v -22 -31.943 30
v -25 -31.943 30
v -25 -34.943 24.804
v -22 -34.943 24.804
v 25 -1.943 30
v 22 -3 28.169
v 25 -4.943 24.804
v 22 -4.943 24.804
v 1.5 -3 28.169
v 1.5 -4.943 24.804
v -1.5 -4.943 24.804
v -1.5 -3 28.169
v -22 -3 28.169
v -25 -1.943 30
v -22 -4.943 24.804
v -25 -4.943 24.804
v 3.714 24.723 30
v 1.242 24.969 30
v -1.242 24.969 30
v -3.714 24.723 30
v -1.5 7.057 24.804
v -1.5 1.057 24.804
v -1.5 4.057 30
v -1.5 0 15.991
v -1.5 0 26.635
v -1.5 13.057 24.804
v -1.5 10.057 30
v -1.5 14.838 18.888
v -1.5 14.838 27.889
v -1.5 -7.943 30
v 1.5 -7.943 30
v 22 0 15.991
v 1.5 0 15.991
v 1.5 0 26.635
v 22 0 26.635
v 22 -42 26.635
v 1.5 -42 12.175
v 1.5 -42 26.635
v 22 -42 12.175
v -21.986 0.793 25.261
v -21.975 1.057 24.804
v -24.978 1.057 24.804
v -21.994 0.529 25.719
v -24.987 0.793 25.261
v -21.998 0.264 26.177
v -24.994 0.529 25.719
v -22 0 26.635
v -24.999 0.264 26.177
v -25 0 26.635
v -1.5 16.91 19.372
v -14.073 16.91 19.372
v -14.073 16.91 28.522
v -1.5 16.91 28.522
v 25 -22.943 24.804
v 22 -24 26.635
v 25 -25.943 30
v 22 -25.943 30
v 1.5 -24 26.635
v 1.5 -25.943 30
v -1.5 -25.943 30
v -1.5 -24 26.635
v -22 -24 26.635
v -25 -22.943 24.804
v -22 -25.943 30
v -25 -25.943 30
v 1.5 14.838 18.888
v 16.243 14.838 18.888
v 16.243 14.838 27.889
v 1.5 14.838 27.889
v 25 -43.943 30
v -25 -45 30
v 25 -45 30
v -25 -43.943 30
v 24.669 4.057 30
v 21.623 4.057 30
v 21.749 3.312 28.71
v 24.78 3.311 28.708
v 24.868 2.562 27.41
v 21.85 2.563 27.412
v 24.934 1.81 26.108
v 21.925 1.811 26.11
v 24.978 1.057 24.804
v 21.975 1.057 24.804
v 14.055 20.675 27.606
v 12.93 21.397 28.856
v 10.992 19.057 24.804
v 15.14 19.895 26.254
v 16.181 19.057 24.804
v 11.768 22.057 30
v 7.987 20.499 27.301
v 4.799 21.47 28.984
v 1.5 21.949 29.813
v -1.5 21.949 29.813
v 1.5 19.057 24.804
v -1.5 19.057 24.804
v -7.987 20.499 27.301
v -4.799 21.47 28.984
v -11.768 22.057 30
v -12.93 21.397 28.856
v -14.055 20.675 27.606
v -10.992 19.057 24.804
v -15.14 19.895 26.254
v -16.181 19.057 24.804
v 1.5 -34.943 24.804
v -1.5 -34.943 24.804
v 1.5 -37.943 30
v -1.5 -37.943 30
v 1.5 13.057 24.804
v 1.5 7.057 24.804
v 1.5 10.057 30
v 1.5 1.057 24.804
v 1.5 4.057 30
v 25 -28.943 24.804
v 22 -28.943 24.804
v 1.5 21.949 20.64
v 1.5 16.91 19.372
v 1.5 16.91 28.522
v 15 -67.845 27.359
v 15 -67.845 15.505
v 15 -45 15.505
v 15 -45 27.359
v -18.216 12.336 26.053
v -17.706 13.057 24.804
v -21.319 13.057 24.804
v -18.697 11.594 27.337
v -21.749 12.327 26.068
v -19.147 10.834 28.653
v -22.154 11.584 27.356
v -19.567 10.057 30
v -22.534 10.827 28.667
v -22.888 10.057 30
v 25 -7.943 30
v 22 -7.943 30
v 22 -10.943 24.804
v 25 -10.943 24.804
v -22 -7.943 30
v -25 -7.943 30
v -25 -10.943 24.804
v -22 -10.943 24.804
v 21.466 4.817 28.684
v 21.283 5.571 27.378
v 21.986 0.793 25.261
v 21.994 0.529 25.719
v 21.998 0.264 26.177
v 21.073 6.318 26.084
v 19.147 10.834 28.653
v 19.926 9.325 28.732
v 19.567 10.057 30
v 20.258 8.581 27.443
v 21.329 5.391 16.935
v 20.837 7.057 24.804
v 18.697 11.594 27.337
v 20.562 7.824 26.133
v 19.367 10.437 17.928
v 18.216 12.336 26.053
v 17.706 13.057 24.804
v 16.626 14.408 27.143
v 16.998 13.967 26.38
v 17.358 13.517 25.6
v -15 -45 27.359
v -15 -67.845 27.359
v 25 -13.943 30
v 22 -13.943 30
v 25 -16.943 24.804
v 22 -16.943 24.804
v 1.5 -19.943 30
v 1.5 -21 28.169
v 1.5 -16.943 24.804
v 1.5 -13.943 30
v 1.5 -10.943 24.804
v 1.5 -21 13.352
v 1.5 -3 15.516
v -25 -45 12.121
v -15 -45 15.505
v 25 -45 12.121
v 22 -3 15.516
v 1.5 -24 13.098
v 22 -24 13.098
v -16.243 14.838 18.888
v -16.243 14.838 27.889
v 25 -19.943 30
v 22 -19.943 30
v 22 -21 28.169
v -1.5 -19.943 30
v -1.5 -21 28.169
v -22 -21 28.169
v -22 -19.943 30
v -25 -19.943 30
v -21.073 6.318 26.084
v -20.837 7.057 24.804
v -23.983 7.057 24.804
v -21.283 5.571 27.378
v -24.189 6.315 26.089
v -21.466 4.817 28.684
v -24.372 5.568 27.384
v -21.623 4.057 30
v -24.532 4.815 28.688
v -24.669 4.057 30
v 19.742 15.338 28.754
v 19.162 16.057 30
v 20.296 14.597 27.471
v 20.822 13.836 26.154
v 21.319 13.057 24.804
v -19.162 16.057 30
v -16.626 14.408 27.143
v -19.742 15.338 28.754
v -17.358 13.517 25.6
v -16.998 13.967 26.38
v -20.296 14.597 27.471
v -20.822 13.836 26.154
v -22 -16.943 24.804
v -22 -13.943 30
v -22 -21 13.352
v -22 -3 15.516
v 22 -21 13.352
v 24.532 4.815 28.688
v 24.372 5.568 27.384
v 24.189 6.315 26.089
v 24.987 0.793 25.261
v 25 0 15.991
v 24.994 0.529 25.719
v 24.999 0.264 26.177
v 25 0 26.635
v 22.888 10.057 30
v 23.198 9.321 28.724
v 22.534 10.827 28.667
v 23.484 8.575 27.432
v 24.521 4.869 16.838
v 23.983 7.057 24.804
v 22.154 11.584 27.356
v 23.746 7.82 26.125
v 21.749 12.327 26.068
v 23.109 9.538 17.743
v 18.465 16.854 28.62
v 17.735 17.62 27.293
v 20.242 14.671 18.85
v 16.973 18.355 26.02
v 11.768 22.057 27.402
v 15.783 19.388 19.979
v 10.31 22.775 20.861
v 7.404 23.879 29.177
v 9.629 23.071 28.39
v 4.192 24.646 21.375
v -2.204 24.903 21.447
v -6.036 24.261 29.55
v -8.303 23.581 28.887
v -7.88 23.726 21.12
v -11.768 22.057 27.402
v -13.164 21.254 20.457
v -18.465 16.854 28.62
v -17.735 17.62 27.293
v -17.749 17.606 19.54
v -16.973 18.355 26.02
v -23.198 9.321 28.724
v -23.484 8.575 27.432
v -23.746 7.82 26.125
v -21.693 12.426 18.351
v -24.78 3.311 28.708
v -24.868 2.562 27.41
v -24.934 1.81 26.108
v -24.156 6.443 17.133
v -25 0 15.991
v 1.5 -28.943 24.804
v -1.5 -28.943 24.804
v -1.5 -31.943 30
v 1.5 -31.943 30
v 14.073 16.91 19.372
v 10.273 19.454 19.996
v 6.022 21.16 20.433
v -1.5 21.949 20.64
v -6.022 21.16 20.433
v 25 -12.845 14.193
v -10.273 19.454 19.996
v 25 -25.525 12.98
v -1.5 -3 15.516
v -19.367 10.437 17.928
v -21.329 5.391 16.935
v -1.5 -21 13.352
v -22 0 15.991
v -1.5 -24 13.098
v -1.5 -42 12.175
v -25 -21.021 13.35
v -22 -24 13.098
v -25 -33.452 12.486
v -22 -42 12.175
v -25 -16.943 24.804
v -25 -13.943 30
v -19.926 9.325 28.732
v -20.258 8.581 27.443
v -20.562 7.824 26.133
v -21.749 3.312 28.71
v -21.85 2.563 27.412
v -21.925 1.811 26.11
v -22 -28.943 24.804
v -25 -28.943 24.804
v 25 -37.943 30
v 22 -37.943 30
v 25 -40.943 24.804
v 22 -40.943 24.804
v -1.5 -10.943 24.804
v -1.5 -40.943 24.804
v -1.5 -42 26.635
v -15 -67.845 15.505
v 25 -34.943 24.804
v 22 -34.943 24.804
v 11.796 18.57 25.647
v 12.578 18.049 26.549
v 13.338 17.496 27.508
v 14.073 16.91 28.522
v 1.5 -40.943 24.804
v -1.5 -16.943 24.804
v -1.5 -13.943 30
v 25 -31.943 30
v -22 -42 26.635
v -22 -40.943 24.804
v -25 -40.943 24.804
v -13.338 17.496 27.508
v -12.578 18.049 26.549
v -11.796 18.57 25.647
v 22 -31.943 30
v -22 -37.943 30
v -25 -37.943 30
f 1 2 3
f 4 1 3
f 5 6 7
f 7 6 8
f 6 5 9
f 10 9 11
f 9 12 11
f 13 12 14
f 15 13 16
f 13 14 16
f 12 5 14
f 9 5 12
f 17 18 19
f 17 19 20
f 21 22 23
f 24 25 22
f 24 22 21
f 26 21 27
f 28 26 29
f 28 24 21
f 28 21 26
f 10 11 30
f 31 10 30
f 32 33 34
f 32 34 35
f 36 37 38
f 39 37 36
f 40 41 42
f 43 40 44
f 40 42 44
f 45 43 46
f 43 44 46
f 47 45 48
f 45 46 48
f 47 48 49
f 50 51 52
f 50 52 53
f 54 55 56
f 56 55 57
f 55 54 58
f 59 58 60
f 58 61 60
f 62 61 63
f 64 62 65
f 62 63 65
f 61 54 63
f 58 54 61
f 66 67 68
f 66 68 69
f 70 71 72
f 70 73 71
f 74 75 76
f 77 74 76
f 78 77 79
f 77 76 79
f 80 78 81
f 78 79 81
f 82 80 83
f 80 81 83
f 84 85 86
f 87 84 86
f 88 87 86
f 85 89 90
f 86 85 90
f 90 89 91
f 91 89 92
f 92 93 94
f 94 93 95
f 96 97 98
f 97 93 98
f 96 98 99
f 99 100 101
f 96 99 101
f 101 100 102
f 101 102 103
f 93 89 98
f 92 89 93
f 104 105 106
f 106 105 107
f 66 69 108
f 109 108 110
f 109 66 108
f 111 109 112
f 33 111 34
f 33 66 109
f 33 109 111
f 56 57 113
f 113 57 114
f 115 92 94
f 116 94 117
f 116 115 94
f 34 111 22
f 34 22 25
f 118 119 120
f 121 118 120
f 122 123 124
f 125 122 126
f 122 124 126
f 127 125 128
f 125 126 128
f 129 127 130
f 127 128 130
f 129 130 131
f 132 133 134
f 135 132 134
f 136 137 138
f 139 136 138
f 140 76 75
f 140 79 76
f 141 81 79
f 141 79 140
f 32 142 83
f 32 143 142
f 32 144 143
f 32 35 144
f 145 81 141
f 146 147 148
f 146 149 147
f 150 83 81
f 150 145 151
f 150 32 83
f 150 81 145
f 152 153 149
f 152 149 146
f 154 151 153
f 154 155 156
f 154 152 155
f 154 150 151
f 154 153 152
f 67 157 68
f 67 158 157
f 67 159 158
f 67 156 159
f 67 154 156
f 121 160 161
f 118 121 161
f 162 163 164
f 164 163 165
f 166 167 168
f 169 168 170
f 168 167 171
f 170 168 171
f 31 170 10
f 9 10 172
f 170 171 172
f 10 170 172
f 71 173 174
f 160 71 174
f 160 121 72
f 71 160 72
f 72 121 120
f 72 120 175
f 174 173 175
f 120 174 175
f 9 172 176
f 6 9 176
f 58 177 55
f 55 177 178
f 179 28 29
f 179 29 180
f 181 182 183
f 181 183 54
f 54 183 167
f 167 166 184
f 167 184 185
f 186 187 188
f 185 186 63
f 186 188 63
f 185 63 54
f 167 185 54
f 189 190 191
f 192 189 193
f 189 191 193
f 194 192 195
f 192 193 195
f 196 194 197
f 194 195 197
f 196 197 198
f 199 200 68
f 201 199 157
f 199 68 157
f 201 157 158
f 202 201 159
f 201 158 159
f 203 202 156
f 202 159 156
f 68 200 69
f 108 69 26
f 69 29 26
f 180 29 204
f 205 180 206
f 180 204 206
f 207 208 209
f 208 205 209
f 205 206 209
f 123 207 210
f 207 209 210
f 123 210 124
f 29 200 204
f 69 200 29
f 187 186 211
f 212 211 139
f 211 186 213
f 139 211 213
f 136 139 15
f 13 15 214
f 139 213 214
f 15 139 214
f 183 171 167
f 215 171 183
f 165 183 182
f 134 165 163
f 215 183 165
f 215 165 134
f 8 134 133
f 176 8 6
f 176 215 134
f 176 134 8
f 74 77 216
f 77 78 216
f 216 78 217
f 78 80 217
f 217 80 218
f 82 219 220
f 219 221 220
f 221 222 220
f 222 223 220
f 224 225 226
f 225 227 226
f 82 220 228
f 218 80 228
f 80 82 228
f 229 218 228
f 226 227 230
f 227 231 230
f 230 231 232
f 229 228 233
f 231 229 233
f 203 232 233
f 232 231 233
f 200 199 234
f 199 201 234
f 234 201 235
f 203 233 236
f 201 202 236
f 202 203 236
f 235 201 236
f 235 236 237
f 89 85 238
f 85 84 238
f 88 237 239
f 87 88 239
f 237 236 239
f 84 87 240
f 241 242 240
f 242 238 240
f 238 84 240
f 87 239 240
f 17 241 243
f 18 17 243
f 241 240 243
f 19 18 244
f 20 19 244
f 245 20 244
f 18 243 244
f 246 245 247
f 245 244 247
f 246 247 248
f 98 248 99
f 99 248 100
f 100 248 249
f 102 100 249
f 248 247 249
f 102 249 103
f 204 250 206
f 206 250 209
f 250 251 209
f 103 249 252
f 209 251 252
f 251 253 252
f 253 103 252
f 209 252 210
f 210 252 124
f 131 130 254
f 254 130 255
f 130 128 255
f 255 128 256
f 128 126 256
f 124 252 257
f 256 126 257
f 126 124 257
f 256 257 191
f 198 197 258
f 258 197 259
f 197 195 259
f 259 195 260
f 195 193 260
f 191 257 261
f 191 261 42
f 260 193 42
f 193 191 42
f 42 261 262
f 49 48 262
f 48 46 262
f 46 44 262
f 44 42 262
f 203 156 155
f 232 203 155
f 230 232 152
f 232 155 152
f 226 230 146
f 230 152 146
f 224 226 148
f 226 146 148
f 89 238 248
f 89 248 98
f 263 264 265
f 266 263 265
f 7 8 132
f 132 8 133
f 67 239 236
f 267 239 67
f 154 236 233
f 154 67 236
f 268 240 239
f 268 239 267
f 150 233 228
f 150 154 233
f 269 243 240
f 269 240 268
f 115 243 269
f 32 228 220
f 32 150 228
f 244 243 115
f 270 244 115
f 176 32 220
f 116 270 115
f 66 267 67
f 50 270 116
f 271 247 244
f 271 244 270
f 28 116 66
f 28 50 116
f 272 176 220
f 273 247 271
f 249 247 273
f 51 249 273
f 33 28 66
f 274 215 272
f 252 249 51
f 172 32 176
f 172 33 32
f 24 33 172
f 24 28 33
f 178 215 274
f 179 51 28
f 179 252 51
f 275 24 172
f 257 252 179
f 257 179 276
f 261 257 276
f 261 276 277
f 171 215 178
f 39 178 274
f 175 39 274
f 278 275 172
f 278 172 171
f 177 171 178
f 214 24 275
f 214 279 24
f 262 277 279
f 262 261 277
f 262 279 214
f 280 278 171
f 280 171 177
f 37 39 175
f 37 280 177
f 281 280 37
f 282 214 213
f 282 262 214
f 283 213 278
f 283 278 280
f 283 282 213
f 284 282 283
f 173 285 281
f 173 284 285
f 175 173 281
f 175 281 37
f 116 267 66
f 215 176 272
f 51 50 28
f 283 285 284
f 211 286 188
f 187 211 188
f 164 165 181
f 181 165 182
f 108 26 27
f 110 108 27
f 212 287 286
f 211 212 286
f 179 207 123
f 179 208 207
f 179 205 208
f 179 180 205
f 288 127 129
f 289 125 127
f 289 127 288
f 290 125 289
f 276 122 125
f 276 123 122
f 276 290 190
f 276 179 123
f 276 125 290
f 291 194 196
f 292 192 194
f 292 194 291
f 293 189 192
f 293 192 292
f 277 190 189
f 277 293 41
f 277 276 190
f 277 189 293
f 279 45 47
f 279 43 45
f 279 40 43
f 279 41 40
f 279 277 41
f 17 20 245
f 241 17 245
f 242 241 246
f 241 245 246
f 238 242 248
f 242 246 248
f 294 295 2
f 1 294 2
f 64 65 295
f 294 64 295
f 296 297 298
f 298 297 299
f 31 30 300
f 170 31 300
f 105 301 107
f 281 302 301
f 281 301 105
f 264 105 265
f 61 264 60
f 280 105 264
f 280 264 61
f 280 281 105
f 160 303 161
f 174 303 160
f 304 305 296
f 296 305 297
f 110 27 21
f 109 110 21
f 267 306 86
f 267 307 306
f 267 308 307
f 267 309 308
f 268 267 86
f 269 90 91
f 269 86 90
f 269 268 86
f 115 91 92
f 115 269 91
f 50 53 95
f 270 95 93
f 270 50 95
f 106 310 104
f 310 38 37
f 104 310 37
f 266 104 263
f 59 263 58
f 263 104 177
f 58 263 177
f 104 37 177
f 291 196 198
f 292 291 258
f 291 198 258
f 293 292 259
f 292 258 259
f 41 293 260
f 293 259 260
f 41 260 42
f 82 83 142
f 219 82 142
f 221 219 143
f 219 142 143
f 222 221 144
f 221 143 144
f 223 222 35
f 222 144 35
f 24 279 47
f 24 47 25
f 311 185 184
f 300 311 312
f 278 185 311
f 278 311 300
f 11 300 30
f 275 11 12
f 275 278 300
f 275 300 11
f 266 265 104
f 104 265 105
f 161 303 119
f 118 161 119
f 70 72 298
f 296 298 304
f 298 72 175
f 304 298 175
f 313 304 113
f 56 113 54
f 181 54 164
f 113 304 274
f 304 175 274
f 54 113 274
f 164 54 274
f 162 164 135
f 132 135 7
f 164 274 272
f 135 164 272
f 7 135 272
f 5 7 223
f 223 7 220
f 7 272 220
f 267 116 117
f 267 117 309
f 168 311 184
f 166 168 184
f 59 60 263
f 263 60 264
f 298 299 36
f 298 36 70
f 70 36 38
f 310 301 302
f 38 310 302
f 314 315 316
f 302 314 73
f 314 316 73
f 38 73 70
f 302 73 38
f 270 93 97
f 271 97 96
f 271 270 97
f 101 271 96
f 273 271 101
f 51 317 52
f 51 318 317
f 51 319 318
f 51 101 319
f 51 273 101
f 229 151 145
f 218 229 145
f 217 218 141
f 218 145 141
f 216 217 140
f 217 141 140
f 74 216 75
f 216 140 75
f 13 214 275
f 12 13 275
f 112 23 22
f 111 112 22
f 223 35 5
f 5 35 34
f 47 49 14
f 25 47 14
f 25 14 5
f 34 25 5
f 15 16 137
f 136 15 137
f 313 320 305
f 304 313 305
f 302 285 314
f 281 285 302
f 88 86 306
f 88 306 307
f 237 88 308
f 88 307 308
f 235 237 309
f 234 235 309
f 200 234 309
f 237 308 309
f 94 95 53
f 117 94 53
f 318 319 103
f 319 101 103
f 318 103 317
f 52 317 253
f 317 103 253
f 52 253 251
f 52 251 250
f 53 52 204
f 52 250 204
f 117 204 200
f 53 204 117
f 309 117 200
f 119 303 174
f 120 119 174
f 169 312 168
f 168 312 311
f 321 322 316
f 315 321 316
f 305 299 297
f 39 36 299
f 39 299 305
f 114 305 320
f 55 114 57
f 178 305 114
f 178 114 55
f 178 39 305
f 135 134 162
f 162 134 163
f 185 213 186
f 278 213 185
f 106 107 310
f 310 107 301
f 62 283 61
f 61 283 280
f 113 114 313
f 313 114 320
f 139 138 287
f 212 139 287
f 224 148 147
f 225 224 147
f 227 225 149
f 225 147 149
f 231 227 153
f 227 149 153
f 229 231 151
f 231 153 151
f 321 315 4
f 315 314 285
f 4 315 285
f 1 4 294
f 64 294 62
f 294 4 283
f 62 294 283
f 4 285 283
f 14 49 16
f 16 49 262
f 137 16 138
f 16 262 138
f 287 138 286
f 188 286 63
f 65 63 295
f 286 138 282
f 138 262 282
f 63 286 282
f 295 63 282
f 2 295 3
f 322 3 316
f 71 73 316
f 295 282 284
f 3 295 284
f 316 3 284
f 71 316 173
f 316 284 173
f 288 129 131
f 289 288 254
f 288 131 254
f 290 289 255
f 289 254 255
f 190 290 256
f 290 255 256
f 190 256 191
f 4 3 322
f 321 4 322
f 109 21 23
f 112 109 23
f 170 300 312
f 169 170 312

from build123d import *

# Parameters (mm, degrees)
F0_W      = 30
F0_H      = 22.8446739912
F1_DEPTH  = 30
F3_DEPTH  = 50.001
F5_DEPTH  = 50.001
F6_W      = 20.5
F6_H      = 18
F7_DEPTH  = 30.001
F8_W      = 23.6850994825
F8_H      = 6.8956923813
F9_DEPTH  = 50.001
F11_DEPTH = 50.001
F12_W     = 22.8446739912
F12_H     = 2.6407527924
F13_DEPTH = 40.0010001


with BuildPart() as f1:
    # F0 (on Top) → F1 (new body)
    with BuildSketch(Plane.XY):
        with BuildLine():
            ThreePointArc((25, 0), (0, 25), (-25, 0))
            Line((-25, 0), (-25, -45))
            Line((-25, -45), (-15, -45))
            Line((-15, -45), (15, -45))
            Line((15, -45), (25, -45))
            Line((25, -45), (25, 0))
        make_face()
        with Locations((0, -56.4223369956)):
            Rectangle(F0_W, F0_H)
    extrude(amount=F1_DEPTH)

    # F2 (on face) → F3 (cut, through all)
    with BuildSketch(Plane(origin=(-25, 0, 0), x_dir=(0, -1, 0), z_dir=(-1, 0, 0))):
        Polygon((0, 0), (0, 6.8956923813), (-25.6583113223, 19.2217491567), (-25.6583113223, 0), align=None)
        Polygon((0, 0), (14.3542923033, 0), (0, 6.8956923813), align=None)
    extrude(amount=-F3_DEPTH, mode=Mode.SUBTRACT)

    # F4 (on face) → F5 (cut, through all)
    with BuildSketch(Plane(origin=(-25, 0, 0), x_dir=(0, -1, 0), z_dir=(-1, 0, 0))):
        Polygon((-22.0570550542, 27.4019237886), (-22.0570550542, 30), (-24.7225984931, 30), align=None)
        Polygon((-19.0570550542, 24.8038475773), (-16.0570550542, 30), (-22.0570550542, 30), align=None)
        Polygon((-13.0570550542, 24.8038475773), (-10.0570550542, 30), (-16.0570550542, 30), align=None)
        Polygon((-7.0570550542, 24.8038475773), (-4.0570550542, 30), (-10.0570550542, 30), align=None)
        Polygon((-1.0570550542, 24.8038475773), (0, 26.6347206375), (0, 30), (-4.0570550542, 30), align=None)
        Polygon((0, 30), (0, 26.6347206375), (1.9429449458, 30), align=None)
        Polygon((4.9429449458, 24.8038475773), (7.9429449458, 30), (1.9429449458, 30), align=None)
        Polygon((10.9429449458, 24.8038475773), (13.9429449458, 30), (7.9429449458, 30), align=None)
        Polygon((16.9429449458, 24.8038475773), (19.9429449458, 30), (13.9429449458, 30), align=None)
        Polygon((22.9429449458, 24.8038475773), (25.9429449458, 30), (19.9429449458, 30), align=None)
        Polygon((28.9429449458, 24.8038475773), (31.9429449458, 30), (25.9429449458, 30), align=None)
        Polygon((34.9429449458, 24.8038475773), (37.9429449458, 30), (31.9429449458, 30), align=None)
        Polygon((40.9429449458, 24.8038475773), (43.9429449458, 30), (37.9429449458, 30), align=None)
    extrude(amount=-F5_DEPTH, mode=Mode.SUBTRACT)

    # F6 (on Top) → F7 (cut, through all)
    with BuildSketch(Plane.XY):
        with BuildLine():
            ThreePointArc((14.0728856666, 16.9101711705), (8.1838650627, 20.4211741248), (1.5, 21.9488040676))
            Line((1.5, 21.9488040676), (1.5, 16.9101711705))
            Line((1.5, 16.9101711705), (14.0728856666, 16.9101711705))
        make_face()
        with BuildLine():
            ThreePointArc((-1.5, 21.9488040676), (-8.1838650627, 20.4211741248), (-14.0728856666, 16.9101711705))
            Line((-14.0728856666, 16.9101711705), (-1.5, 16.9101711705))
            Line((-1.5, 16.9101711705), (-1.5, 21.9488040676))
        make_face()
        with BuildLine():
            Line((1.5, 14.8383843921), (1.5, 0))
            Line((1.5, 0), (22, 0))
            ThreePointArc((22, 0), (20.5102096408, 7.9580965369), (16.2426090463, 14.8383843921))
            Line((16.2426090463, 14.8383843921), (1.5, 14.8383843921))
        make_face()
        with BuildLine():
            ThreePointArc((-16.2426090463, 14.8383843921), (-20.5102096408, 7.9580965369), (-22, 0))
            Line((-22, 0), (-1.5, 0))
            Line((-1.5, 0), (-1.5, 14.8383843921))
            Line((-1.5, 14.8383843921), (-16.2426090463, 14.8383843921))
        make_face()
        with Locations((-11.75, -12)):
            Rectangle(F6_W, F6_H)
        with Locations((-11.75, -33)):
            Rectangle(F6_W, F6_H)
        with Locations((11.75, -12)):
            Rectangle(F6_W, F6_H)
        with Locations((11.75, -33)):
            Rectangle(F6_W, F6_H)
    extrude(amount=F7_DEPTH, mode=Mode.SUBTRACT)

    # F8 (on face) → F9 (cut, through all)
    with BuildSketch(Plane(origin=(-25, 0, 0), x_dir=(0, -1, 0), z_dir=(-1, 0, 0))):
        with Locations((56.8425497413, 3.4478461906)):
            Rectangle(F8_W, F8_H)
        Polygon((0, 6.8956923813), (14.3542923033, 0), (45, 0), (45, 6.8956923813), align=None)
    extrude(amount=-F9_DEPTH, mode=Mode.SUBTRACT)

    # F10 (on face) → F11 (cut, through all)
    with BuildSketch(Plane(origin=(-25, 0, 0), x_dir=(0, -1, 0), z_dir=(-1, 0, 0))):
        with BuildLine():
            add(Edge.make_bspline(
                [(-25.4602208734, 21.6052159667), (-1.3237191597, 14.7319072857), (24.7841980308, 12.3858377337), (45, 12.1211158112)],
                knots=[0, 0, 0, 0, 71.0956460079, 71.0956460079, 71.0956460079, 71.0956460079], degree=3))
            Line((-25.4602208734, 21.6052159667), (-25.4602208734, 18.728017807))
            Line((-25.4602208734, 18.728017807), (0, 6.8956923813))
            Line((0, 6.8956923813), (45, 6.8956923813))
            Line((45, 6.8956923813), (45, 12.1211158112))
        make_face()
    extrude(amount=-F11_DEPTH, mode=Mode.SUBTRACT)

    # F12 (on face) → F13 (cut, through all)
    with BuildSketch(Plane(origin=(-15, 0, 0), x_dir=(0, -1, 0), z_dir=(-1, 0, 0))):
        with Locations((56.4223369956, 28.6796236038)):
            Rectangle(F12_W, F12_H)
        Polygon((67.8446739912, 15.5053976923), (45, 15.5053976923), (45, 12.1211158112), (45, 6.8956923813), (67.8446739912, 6.8956923813), align=None)
    extrude(amount=-F13_DEPTH, mode=Mode.SUBTRACT)


solid = f1.part
